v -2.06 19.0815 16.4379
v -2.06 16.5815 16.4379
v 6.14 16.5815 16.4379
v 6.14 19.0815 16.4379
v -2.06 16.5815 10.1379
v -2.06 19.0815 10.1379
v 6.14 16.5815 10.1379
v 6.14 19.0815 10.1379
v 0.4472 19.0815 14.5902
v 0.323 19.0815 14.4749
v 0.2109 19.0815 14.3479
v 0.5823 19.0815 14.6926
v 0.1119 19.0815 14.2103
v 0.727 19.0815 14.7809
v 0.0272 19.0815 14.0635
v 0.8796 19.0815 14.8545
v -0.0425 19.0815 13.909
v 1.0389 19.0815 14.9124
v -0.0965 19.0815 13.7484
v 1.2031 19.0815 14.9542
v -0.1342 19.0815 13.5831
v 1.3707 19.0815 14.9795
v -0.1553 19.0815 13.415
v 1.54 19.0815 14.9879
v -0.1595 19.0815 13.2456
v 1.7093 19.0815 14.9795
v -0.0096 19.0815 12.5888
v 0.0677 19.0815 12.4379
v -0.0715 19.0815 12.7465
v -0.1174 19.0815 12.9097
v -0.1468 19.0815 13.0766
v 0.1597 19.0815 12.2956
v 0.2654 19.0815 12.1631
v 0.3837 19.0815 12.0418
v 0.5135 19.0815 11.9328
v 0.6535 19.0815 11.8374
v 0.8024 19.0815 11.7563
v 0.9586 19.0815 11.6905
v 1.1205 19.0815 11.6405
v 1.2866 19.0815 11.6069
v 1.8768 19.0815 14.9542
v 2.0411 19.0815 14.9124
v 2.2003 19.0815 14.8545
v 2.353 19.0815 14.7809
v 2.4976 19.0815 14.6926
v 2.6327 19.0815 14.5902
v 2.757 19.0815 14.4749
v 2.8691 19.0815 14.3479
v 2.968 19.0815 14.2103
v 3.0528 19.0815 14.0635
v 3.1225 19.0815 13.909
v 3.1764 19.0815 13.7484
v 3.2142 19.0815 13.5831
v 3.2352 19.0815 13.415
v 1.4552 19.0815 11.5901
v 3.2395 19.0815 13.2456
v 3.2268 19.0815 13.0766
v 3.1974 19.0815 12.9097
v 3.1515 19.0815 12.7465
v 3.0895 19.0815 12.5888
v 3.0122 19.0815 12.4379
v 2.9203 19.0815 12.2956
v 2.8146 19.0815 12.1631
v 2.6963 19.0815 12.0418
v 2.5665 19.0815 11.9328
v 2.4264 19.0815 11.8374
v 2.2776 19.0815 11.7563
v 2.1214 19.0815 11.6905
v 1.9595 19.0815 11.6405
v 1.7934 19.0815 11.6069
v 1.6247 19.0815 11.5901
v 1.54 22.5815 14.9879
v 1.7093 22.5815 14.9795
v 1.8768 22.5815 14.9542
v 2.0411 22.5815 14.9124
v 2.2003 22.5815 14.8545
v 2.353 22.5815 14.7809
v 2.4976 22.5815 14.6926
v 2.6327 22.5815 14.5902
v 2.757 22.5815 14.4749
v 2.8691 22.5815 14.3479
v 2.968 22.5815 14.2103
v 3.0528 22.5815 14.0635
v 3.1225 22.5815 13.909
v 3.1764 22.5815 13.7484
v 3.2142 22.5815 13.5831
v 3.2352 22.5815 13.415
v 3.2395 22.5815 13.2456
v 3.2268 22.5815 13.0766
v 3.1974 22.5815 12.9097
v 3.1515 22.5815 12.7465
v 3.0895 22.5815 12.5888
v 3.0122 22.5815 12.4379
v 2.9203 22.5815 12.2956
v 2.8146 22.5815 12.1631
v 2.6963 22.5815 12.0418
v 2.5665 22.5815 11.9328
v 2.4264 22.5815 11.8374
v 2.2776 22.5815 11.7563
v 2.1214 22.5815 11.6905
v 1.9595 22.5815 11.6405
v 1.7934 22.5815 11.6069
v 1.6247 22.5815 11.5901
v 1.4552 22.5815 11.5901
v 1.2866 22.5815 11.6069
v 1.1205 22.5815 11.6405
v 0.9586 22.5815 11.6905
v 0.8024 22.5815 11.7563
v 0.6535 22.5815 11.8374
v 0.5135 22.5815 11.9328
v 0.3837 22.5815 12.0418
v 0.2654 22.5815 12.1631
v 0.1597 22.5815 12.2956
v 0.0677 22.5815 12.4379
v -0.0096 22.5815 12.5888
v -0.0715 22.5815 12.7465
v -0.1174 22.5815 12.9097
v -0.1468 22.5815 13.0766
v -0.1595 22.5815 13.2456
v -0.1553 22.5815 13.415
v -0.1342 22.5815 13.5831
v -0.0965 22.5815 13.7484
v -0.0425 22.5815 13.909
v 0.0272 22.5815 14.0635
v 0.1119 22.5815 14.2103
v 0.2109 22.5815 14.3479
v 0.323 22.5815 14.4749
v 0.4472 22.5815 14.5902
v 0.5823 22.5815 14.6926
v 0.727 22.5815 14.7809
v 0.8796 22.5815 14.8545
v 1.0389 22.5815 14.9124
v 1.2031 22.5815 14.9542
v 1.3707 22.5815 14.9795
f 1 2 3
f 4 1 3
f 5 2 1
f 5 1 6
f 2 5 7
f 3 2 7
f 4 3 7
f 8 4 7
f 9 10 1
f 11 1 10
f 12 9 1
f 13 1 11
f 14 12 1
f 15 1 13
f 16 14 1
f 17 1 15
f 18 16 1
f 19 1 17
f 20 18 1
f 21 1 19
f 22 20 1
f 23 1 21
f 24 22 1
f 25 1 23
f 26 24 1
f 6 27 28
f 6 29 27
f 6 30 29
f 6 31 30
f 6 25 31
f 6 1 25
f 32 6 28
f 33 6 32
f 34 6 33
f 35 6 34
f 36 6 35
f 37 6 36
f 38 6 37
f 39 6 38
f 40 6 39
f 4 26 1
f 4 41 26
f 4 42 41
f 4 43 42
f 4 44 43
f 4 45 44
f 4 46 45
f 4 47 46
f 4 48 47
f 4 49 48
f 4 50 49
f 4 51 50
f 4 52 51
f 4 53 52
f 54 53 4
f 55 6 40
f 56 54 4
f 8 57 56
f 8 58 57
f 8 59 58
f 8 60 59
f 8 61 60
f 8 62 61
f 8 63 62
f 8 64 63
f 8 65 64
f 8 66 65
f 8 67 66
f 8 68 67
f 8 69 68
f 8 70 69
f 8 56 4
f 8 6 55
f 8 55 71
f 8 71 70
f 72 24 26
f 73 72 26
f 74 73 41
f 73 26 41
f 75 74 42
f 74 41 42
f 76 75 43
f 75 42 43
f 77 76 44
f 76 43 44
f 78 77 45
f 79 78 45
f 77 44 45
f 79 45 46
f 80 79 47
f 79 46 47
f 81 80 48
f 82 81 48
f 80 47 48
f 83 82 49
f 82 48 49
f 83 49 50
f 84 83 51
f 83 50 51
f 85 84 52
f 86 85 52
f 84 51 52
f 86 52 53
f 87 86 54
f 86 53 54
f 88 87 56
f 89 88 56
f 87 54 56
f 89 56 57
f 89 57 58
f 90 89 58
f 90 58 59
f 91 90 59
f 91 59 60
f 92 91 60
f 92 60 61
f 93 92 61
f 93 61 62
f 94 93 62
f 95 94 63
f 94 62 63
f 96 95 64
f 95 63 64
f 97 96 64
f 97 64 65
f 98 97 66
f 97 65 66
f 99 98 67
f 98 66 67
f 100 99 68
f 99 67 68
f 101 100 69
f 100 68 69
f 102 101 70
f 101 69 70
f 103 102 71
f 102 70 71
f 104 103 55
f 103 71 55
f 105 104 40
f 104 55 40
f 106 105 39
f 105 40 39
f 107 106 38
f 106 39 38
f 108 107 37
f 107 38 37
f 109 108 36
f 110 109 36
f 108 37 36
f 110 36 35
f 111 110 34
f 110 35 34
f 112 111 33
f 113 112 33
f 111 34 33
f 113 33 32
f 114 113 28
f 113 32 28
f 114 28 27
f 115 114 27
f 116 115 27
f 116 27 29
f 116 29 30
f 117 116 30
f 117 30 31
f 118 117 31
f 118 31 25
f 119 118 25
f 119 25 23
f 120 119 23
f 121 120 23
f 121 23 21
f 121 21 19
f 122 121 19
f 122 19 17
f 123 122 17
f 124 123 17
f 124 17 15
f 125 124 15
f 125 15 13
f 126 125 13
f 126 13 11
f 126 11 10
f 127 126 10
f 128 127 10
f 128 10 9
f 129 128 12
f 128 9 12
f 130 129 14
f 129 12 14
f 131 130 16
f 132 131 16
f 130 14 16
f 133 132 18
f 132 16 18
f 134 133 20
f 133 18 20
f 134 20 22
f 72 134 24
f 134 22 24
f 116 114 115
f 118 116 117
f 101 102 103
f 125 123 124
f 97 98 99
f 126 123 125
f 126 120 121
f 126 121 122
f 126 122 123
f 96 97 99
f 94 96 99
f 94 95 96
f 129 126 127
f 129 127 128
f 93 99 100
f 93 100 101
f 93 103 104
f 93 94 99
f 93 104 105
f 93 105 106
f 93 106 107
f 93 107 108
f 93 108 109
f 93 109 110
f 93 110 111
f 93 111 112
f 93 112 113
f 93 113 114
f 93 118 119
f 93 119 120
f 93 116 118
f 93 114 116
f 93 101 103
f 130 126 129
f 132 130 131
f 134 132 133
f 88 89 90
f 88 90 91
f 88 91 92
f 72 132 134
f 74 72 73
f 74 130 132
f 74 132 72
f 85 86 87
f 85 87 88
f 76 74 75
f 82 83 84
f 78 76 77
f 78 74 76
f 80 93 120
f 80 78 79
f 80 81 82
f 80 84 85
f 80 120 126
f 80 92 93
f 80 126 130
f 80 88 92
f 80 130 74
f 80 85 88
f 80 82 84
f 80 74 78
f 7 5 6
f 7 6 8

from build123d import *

# Parameters (mm, degrees)
SKETCH1_W           = 82
SKETCH1_H           = 63
BOSS_EXTRUDE1_DEPTH = 25
SKETCH2_R           = 17
BOSS_EXTRUDE2_DEPTH = 35
SCALE1_SCALE        = 0.1


with BuildPart() as part:
    # Sketch1 → Boss-Extrude1 (new body)
    with BuildSketch(Plane(origin=(0, 0, 0), x_dir=(1, 0, 0), z_dir=(0, 1, 0))):
        with Locations((2.928571429, -13.287946429)):
            Rectangle(SKETCH1_W, SKETCH1_H)
    extrude(amount=BOSS_EXTRUDE1_DEPTH)

    # Sketch2 → Boss-Extrude2 (add)
    with BuildSketch(Plane(origin=(0, 25, 0), x_dir=(1, 0, 0), z_dir=(0, 1, 0))):
        with Locations(Location((-2.071428571, -13.287946429, 0), (0, 0, 270))):
            Circle(SKETCH2_R)
    extrude(amount=BOSS_EXTRUDE2_DEPTH)


with BuildPart() as part_1:
    # Scale1: scaled about (1.941255183, 18.423897472, 13.287946429)
    add(part.part.scale(SCALE1_SCALE).moved(Location((1.747129665, 16.581507725, 11.959151786))))


solid = part_1.part
